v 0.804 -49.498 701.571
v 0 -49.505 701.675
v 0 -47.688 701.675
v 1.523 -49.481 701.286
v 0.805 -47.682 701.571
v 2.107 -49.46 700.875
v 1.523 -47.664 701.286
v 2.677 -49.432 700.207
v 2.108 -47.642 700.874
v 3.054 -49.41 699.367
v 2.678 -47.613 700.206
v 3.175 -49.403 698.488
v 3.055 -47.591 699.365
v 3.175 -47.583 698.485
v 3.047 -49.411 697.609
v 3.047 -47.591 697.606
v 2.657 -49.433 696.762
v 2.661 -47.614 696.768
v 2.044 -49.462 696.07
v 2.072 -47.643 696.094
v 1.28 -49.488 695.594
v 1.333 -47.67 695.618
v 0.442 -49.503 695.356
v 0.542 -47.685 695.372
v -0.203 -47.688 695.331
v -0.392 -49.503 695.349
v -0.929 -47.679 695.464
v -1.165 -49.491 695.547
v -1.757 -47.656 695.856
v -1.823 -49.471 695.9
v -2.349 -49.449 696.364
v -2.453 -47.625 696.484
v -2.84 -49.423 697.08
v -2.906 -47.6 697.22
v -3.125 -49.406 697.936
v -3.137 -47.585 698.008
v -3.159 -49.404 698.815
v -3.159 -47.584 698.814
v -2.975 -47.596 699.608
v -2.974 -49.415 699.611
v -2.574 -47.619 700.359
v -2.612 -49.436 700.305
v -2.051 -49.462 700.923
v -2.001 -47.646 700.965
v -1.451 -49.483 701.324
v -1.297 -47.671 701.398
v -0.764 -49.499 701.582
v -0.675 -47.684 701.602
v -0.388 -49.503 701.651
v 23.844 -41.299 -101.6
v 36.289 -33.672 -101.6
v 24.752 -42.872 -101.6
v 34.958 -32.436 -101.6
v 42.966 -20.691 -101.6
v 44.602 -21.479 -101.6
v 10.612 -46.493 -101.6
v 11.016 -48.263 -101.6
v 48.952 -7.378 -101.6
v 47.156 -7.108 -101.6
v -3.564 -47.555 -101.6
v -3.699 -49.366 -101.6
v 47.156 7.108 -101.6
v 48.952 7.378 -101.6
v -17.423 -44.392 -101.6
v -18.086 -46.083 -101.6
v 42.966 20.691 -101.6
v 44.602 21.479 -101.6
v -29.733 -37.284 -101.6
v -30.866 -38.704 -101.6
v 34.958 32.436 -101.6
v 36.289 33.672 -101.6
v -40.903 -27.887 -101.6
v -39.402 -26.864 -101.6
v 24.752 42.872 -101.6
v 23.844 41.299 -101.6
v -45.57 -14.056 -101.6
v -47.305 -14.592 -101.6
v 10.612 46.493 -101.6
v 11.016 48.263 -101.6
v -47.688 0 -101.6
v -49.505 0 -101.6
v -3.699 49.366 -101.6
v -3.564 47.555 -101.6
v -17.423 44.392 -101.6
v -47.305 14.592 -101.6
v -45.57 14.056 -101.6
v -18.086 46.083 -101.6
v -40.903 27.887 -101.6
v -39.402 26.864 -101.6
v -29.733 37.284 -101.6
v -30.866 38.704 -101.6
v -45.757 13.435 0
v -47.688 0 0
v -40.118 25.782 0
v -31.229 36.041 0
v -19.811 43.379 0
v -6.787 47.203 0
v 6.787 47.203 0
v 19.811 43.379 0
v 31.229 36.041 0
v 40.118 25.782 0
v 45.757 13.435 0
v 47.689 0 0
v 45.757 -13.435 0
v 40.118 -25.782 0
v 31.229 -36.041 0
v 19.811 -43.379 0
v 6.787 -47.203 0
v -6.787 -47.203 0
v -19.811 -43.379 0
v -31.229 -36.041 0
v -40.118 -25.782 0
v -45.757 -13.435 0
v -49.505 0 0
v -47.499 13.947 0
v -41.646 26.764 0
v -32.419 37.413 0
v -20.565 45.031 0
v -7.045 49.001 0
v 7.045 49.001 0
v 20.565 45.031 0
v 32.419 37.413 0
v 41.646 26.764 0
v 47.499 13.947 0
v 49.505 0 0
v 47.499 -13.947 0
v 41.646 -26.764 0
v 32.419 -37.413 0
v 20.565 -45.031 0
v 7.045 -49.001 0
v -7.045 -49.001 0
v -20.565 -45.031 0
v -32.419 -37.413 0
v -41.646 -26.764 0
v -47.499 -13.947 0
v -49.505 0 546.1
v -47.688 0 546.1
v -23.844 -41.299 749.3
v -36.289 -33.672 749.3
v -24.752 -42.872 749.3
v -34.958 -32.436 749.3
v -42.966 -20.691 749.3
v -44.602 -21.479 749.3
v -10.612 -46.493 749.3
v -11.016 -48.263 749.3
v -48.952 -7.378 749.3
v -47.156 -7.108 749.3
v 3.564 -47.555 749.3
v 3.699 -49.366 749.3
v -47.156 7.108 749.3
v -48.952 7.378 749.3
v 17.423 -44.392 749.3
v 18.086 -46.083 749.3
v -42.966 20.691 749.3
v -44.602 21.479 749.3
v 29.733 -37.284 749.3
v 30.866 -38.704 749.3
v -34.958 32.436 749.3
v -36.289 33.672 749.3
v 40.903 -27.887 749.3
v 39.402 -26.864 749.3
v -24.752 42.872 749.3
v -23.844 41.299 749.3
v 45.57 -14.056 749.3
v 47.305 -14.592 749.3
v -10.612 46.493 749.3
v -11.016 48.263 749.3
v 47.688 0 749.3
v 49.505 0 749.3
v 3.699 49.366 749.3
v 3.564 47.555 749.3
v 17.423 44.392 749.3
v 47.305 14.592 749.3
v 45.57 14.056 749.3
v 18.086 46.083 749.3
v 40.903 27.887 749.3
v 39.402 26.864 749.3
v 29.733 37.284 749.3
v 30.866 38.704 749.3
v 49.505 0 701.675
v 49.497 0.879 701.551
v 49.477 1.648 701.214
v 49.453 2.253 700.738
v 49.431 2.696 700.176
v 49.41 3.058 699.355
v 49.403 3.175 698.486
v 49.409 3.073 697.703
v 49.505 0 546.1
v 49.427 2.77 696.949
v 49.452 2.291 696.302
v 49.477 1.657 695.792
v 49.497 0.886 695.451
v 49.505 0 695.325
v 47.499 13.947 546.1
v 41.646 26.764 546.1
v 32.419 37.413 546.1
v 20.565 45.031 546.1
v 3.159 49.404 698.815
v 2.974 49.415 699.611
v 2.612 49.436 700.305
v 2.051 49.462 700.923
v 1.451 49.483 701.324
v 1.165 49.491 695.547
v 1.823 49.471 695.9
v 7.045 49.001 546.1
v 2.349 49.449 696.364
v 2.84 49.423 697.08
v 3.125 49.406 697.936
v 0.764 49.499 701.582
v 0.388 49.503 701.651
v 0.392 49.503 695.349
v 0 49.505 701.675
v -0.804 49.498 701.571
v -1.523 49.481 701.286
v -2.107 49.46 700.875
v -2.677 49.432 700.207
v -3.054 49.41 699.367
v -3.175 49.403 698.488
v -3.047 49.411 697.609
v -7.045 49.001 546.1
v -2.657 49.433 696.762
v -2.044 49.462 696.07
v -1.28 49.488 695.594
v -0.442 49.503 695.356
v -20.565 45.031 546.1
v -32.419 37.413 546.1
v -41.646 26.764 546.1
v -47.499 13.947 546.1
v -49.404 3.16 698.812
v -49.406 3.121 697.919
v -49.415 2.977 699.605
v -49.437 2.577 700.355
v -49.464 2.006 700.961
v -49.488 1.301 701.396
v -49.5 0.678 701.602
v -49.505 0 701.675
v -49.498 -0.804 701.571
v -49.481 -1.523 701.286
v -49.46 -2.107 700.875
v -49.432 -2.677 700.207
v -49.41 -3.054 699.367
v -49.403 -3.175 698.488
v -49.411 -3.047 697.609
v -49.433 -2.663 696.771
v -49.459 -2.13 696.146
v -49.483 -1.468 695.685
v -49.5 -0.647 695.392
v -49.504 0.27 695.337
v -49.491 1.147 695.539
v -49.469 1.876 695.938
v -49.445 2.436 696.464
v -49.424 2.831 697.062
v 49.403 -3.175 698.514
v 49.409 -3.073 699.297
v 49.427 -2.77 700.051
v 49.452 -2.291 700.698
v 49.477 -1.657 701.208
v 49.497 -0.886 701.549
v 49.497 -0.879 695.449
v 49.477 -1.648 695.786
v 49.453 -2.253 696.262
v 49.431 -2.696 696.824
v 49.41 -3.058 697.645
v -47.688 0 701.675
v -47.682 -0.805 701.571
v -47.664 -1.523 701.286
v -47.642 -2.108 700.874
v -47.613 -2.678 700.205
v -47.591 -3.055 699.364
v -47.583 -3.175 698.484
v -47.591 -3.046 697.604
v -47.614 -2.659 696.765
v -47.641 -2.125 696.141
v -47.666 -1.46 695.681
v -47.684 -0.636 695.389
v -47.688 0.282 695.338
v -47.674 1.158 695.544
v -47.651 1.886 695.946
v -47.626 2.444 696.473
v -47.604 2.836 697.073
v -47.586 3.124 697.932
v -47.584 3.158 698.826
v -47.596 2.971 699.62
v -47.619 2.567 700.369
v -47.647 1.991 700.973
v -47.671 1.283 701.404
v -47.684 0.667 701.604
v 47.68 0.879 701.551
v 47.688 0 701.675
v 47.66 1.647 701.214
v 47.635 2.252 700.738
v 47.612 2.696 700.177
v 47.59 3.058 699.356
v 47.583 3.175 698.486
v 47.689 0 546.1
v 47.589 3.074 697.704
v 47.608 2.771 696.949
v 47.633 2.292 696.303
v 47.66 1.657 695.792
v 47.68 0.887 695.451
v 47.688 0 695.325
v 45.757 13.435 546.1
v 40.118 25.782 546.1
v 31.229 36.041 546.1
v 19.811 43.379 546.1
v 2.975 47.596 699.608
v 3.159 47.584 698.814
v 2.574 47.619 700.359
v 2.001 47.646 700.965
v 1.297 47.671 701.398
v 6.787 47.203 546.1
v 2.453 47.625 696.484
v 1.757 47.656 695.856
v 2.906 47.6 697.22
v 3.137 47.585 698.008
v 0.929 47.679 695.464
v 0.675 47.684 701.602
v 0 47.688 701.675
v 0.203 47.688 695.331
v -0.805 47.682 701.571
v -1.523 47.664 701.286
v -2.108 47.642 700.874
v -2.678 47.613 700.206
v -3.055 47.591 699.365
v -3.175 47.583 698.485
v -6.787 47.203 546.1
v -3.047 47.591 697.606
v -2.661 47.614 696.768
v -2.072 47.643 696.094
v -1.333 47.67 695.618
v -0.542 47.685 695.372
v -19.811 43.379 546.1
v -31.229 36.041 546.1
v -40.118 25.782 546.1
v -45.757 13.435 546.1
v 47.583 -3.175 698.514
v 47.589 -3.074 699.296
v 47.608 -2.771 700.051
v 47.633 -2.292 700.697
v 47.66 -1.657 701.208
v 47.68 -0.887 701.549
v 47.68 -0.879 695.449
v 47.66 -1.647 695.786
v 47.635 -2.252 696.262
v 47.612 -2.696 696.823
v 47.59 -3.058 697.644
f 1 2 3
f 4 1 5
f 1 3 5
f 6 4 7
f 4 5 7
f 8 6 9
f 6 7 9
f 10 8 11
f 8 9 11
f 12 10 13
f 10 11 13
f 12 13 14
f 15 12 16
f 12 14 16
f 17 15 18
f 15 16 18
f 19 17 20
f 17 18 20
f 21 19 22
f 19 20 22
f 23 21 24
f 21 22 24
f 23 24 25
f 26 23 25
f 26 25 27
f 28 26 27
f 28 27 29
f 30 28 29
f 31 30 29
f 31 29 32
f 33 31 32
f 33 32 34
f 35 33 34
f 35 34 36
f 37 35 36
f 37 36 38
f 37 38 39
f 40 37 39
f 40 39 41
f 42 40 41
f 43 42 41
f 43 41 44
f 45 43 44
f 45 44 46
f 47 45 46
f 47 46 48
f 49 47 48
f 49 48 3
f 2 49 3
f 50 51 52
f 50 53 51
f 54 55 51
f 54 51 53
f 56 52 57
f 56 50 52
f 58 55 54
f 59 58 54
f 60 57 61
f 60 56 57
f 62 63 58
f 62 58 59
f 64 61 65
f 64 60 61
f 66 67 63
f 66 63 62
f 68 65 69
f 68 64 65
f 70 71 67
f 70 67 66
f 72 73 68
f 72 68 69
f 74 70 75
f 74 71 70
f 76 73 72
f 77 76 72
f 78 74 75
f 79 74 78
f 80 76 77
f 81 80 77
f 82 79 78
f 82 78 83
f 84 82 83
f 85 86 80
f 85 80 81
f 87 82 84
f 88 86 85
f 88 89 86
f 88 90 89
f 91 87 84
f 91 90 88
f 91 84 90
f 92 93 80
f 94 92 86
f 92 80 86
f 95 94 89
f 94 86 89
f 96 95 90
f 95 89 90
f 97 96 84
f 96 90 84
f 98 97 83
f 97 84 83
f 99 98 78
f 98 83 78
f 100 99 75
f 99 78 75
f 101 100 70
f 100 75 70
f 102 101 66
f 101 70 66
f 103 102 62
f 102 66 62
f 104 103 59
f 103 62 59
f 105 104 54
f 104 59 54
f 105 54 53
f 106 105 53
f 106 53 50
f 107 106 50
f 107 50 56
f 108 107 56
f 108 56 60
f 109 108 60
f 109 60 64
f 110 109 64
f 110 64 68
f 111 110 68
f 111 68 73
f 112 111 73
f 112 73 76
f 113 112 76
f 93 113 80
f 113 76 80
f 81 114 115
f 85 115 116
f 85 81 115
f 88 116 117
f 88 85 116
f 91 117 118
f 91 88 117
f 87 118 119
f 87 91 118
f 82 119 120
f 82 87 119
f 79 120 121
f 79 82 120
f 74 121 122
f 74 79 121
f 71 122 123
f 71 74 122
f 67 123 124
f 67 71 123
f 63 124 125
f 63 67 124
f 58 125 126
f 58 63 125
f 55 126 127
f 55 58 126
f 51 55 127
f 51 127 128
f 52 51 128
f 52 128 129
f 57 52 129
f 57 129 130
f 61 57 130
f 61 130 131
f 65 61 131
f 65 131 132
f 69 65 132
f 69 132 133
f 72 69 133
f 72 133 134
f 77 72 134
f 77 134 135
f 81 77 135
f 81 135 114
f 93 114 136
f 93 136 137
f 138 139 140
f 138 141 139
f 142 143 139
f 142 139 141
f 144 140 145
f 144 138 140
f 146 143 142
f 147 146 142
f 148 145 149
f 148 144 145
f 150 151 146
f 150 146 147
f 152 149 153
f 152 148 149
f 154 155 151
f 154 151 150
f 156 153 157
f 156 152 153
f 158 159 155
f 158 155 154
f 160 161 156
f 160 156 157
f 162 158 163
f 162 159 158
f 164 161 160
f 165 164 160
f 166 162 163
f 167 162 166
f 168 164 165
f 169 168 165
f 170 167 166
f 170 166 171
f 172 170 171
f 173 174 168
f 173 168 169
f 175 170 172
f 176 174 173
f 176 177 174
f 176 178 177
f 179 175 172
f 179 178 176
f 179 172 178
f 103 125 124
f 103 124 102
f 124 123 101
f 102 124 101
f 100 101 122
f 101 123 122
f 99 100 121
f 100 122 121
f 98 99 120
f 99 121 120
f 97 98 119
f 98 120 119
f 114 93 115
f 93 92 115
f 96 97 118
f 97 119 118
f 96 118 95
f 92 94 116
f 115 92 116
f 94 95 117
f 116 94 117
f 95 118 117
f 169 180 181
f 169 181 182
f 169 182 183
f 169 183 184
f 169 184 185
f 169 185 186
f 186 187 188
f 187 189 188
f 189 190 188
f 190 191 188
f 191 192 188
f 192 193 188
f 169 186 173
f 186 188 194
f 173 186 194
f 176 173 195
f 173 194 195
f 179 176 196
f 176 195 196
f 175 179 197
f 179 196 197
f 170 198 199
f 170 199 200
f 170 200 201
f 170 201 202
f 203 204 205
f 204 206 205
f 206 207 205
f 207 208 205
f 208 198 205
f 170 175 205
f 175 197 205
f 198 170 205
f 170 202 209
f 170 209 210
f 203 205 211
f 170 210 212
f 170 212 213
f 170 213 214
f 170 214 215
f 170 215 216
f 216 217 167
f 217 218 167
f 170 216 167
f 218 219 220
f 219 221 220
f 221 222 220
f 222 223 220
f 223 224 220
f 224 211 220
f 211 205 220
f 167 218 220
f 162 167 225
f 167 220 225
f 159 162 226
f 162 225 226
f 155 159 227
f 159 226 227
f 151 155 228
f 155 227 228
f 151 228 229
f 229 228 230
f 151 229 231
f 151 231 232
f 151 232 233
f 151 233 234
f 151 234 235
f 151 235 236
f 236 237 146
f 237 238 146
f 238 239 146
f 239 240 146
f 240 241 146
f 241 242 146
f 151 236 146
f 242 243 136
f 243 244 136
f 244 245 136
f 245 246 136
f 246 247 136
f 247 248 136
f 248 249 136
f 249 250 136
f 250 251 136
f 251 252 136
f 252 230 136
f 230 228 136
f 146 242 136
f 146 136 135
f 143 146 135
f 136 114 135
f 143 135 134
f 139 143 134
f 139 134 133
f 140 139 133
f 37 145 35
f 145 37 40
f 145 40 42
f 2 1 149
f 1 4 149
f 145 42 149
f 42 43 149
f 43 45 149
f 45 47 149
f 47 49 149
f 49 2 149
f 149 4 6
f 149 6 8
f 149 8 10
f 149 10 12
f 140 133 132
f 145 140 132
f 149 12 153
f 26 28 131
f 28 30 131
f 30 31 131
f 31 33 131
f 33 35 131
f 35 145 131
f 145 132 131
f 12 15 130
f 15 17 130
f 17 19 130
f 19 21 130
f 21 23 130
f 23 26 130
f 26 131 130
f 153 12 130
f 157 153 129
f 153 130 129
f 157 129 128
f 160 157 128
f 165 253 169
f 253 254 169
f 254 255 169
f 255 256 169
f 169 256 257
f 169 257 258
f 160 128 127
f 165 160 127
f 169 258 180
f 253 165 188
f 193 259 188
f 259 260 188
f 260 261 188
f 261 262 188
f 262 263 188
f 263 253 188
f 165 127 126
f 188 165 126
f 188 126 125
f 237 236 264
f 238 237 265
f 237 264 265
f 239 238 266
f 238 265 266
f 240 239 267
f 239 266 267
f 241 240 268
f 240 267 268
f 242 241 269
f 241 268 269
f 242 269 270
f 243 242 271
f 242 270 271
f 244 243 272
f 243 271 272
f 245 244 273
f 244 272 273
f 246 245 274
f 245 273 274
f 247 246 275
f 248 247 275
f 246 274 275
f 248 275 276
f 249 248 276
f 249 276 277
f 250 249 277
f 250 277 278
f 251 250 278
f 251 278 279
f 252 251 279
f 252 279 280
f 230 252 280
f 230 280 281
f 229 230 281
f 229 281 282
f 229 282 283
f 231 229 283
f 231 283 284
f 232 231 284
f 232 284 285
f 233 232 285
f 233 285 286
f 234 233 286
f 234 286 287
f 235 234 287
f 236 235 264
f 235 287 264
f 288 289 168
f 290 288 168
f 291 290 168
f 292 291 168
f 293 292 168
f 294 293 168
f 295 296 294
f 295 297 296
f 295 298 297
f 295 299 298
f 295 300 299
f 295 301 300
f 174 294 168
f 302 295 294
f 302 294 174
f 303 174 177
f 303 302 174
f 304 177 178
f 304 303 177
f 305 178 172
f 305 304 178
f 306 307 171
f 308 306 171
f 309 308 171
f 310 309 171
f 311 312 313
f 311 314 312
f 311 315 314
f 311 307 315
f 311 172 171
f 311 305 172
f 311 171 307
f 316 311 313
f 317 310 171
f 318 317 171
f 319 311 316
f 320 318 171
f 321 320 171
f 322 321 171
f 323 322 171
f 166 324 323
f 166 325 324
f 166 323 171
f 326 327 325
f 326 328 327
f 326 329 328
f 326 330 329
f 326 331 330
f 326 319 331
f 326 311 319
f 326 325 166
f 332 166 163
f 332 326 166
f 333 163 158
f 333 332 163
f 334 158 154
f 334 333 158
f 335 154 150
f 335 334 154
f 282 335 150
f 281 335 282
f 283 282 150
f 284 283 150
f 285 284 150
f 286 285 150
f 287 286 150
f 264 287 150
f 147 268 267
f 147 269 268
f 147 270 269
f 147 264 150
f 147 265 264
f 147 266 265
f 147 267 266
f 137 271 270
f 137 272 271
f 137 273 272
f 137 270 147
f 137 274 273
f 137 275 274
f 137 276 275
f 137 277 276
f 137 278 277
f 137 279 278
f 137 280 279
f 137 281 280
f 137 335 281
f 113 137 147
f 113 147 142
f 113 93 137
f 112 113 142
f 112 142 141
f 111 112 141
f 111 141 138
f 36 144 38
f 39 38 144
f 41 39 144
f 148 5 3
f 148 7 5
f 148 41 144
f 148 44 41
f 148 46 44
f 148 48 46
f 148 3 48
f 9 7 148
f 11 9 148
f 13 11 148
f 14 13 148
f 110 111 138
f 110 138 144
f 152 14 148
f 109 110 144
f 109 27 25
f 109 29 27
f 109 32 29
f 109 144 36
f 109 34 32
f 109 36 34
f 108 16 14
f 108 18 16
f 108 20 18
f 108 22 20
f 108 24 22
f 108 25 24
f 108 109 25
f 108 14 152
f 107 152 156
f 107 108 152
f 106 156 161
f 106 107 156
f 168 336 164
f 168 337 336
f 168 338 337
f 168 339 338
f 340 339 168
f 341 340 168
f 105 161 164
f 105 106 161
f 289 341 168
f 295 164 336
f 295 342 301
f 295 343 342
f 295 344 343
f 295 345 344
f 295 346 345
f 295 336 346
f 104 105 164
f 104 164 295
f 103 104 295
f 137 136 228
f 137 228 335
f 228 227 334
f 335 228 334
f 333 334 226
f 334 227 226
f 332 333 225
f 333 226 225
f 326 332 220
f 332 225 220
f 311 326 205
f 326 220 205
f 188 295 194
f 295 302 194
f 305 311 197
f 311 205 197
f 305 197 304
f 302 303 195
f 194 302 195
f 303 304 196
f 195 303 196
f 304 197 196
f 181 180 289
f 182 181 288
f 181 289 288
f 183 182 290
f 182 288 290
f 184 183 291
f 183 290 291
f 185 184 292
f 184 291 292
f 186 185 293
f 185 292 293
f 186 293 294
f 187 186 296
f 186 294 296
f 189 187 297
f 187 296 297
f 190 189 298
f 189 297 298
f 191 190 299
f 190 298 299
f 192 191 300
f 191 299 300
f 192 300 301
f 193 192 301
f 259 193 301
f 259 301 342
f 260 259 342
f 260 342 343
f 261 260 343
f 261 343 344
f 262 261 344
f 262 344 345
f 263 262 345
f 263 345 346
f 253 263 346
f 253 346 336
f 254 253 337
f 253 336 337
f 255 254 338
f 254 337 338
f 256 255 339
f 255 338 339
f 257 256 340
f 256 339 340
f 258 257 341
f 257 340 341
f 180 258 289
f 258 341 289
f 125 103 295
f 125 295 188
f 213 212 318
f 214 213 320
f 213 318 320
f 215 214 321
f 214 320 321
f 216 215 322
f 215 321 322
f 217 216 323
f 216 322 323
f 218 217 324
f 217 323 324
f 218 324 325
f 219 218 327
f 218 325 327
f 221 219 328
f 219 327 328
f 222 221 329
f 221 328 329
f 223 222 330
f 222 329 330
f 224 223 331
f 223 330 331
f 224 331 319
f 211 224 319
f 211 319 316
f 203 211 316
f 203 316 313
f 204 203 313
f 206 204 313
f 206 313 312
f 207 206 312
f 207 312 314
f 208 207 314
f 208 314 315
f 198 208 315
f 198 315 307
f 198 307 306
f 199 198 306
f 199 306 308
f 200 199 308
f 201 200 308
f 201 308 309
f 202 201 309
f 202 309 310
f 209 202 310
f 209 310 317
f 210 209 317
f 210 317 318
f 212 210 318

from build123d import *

# Parameters (mm, degrees)
BOSS_EXTRUDE1_DEPTH = 546.1
SKETCH2_R           = 49.5046
SKETCH2_R_2         = 47.6885
BOSS_EXTRUDE2_DEPTH = 203.2
BOSS_EXTRUDE3_START = 101.6
SKETCH3_R           = 49.5046
SKETCH3_R_2         = 47.6885
BOSS_EXTRUDE3_DEPTH = 101.6
SKETCH4_R           = 3.175
CUT_EXTRUDE1_DEPTH  = 753.563552693
CIRPATTERN1_COUNT   = 4


with BuildPart() as part:
    # Sketch1 → Boss-Extrude1 (new body)
    with BuildSketch(Plane.XY):
        with BuildLine():
            Line((-49.5046, 0), (-47.6885, 0))
            ThreePointArc((-47.6885, 0), (0, -47.6885), (47.6885, 0))
            Line((47.6885, 0), (49.5046, 0))
            ThreePointArc((49.5046, 0), (0, -49.5046), (-49.5046, 0))
        make_face()
    extrude(amount=BOSS_EXTRUDE1_DEPTH)

    # Sketch2 → Boss-Extrude2 (add)
    with BuildSketch(Plane.XY.offset(546.1)):
        Circle(SKETCH2_R)
        Circle(SKETCH2_R_2, mode=Mode.SUBTRACT)
    extrude(amount=BOSS_EXTRUDE2_DEPTH)

    # Sketch3 → Boss-Extrude3 (add)
    with BuildSketch(Plane(origin=(0, 0, 0), x_dir=(-1, 0, 0), z_dir=(0, 0, -1)).offset(BOSS_EXTRUDE3_START)):
        Circle(SKETCH3_R)
        Circle(SKETCH3_R_2, mode=Mode.SUBTRACT)
    extrude(amount=-BOSS_EXTRUDE3_DEPTH)

    # Sketch4 → Cut-Extrude1 (cut, through all)
    with BuildSketch(Plane(origin=(0, 0, 0), x_dir=(1, 0, 0), z_dir=(0, 1, 0))):
        with Locations(Location((0, -698.5, 0), (0, 0, 270))):
            Circle(SKETCH4_R)
    cut_extrude1 = extrude(amount=-CUT_EXTRUDE1_DEPTH, mode=Mode.SUBTRACT)

    # CirPattern1: Cut-Extrude1 ×4 about axis
    cirpattern1_axis = Axis((0, 0, 546.1), (0, 0, -1))
    for i in range(1, CIRPATTERN1_COUNT):
        add(cut_extrude1.rotate(cirpattern1_axis, i * 360 / CIRPATTERN1_COUNT), mode=Mode.SUBTRACT)


solid = part.part
